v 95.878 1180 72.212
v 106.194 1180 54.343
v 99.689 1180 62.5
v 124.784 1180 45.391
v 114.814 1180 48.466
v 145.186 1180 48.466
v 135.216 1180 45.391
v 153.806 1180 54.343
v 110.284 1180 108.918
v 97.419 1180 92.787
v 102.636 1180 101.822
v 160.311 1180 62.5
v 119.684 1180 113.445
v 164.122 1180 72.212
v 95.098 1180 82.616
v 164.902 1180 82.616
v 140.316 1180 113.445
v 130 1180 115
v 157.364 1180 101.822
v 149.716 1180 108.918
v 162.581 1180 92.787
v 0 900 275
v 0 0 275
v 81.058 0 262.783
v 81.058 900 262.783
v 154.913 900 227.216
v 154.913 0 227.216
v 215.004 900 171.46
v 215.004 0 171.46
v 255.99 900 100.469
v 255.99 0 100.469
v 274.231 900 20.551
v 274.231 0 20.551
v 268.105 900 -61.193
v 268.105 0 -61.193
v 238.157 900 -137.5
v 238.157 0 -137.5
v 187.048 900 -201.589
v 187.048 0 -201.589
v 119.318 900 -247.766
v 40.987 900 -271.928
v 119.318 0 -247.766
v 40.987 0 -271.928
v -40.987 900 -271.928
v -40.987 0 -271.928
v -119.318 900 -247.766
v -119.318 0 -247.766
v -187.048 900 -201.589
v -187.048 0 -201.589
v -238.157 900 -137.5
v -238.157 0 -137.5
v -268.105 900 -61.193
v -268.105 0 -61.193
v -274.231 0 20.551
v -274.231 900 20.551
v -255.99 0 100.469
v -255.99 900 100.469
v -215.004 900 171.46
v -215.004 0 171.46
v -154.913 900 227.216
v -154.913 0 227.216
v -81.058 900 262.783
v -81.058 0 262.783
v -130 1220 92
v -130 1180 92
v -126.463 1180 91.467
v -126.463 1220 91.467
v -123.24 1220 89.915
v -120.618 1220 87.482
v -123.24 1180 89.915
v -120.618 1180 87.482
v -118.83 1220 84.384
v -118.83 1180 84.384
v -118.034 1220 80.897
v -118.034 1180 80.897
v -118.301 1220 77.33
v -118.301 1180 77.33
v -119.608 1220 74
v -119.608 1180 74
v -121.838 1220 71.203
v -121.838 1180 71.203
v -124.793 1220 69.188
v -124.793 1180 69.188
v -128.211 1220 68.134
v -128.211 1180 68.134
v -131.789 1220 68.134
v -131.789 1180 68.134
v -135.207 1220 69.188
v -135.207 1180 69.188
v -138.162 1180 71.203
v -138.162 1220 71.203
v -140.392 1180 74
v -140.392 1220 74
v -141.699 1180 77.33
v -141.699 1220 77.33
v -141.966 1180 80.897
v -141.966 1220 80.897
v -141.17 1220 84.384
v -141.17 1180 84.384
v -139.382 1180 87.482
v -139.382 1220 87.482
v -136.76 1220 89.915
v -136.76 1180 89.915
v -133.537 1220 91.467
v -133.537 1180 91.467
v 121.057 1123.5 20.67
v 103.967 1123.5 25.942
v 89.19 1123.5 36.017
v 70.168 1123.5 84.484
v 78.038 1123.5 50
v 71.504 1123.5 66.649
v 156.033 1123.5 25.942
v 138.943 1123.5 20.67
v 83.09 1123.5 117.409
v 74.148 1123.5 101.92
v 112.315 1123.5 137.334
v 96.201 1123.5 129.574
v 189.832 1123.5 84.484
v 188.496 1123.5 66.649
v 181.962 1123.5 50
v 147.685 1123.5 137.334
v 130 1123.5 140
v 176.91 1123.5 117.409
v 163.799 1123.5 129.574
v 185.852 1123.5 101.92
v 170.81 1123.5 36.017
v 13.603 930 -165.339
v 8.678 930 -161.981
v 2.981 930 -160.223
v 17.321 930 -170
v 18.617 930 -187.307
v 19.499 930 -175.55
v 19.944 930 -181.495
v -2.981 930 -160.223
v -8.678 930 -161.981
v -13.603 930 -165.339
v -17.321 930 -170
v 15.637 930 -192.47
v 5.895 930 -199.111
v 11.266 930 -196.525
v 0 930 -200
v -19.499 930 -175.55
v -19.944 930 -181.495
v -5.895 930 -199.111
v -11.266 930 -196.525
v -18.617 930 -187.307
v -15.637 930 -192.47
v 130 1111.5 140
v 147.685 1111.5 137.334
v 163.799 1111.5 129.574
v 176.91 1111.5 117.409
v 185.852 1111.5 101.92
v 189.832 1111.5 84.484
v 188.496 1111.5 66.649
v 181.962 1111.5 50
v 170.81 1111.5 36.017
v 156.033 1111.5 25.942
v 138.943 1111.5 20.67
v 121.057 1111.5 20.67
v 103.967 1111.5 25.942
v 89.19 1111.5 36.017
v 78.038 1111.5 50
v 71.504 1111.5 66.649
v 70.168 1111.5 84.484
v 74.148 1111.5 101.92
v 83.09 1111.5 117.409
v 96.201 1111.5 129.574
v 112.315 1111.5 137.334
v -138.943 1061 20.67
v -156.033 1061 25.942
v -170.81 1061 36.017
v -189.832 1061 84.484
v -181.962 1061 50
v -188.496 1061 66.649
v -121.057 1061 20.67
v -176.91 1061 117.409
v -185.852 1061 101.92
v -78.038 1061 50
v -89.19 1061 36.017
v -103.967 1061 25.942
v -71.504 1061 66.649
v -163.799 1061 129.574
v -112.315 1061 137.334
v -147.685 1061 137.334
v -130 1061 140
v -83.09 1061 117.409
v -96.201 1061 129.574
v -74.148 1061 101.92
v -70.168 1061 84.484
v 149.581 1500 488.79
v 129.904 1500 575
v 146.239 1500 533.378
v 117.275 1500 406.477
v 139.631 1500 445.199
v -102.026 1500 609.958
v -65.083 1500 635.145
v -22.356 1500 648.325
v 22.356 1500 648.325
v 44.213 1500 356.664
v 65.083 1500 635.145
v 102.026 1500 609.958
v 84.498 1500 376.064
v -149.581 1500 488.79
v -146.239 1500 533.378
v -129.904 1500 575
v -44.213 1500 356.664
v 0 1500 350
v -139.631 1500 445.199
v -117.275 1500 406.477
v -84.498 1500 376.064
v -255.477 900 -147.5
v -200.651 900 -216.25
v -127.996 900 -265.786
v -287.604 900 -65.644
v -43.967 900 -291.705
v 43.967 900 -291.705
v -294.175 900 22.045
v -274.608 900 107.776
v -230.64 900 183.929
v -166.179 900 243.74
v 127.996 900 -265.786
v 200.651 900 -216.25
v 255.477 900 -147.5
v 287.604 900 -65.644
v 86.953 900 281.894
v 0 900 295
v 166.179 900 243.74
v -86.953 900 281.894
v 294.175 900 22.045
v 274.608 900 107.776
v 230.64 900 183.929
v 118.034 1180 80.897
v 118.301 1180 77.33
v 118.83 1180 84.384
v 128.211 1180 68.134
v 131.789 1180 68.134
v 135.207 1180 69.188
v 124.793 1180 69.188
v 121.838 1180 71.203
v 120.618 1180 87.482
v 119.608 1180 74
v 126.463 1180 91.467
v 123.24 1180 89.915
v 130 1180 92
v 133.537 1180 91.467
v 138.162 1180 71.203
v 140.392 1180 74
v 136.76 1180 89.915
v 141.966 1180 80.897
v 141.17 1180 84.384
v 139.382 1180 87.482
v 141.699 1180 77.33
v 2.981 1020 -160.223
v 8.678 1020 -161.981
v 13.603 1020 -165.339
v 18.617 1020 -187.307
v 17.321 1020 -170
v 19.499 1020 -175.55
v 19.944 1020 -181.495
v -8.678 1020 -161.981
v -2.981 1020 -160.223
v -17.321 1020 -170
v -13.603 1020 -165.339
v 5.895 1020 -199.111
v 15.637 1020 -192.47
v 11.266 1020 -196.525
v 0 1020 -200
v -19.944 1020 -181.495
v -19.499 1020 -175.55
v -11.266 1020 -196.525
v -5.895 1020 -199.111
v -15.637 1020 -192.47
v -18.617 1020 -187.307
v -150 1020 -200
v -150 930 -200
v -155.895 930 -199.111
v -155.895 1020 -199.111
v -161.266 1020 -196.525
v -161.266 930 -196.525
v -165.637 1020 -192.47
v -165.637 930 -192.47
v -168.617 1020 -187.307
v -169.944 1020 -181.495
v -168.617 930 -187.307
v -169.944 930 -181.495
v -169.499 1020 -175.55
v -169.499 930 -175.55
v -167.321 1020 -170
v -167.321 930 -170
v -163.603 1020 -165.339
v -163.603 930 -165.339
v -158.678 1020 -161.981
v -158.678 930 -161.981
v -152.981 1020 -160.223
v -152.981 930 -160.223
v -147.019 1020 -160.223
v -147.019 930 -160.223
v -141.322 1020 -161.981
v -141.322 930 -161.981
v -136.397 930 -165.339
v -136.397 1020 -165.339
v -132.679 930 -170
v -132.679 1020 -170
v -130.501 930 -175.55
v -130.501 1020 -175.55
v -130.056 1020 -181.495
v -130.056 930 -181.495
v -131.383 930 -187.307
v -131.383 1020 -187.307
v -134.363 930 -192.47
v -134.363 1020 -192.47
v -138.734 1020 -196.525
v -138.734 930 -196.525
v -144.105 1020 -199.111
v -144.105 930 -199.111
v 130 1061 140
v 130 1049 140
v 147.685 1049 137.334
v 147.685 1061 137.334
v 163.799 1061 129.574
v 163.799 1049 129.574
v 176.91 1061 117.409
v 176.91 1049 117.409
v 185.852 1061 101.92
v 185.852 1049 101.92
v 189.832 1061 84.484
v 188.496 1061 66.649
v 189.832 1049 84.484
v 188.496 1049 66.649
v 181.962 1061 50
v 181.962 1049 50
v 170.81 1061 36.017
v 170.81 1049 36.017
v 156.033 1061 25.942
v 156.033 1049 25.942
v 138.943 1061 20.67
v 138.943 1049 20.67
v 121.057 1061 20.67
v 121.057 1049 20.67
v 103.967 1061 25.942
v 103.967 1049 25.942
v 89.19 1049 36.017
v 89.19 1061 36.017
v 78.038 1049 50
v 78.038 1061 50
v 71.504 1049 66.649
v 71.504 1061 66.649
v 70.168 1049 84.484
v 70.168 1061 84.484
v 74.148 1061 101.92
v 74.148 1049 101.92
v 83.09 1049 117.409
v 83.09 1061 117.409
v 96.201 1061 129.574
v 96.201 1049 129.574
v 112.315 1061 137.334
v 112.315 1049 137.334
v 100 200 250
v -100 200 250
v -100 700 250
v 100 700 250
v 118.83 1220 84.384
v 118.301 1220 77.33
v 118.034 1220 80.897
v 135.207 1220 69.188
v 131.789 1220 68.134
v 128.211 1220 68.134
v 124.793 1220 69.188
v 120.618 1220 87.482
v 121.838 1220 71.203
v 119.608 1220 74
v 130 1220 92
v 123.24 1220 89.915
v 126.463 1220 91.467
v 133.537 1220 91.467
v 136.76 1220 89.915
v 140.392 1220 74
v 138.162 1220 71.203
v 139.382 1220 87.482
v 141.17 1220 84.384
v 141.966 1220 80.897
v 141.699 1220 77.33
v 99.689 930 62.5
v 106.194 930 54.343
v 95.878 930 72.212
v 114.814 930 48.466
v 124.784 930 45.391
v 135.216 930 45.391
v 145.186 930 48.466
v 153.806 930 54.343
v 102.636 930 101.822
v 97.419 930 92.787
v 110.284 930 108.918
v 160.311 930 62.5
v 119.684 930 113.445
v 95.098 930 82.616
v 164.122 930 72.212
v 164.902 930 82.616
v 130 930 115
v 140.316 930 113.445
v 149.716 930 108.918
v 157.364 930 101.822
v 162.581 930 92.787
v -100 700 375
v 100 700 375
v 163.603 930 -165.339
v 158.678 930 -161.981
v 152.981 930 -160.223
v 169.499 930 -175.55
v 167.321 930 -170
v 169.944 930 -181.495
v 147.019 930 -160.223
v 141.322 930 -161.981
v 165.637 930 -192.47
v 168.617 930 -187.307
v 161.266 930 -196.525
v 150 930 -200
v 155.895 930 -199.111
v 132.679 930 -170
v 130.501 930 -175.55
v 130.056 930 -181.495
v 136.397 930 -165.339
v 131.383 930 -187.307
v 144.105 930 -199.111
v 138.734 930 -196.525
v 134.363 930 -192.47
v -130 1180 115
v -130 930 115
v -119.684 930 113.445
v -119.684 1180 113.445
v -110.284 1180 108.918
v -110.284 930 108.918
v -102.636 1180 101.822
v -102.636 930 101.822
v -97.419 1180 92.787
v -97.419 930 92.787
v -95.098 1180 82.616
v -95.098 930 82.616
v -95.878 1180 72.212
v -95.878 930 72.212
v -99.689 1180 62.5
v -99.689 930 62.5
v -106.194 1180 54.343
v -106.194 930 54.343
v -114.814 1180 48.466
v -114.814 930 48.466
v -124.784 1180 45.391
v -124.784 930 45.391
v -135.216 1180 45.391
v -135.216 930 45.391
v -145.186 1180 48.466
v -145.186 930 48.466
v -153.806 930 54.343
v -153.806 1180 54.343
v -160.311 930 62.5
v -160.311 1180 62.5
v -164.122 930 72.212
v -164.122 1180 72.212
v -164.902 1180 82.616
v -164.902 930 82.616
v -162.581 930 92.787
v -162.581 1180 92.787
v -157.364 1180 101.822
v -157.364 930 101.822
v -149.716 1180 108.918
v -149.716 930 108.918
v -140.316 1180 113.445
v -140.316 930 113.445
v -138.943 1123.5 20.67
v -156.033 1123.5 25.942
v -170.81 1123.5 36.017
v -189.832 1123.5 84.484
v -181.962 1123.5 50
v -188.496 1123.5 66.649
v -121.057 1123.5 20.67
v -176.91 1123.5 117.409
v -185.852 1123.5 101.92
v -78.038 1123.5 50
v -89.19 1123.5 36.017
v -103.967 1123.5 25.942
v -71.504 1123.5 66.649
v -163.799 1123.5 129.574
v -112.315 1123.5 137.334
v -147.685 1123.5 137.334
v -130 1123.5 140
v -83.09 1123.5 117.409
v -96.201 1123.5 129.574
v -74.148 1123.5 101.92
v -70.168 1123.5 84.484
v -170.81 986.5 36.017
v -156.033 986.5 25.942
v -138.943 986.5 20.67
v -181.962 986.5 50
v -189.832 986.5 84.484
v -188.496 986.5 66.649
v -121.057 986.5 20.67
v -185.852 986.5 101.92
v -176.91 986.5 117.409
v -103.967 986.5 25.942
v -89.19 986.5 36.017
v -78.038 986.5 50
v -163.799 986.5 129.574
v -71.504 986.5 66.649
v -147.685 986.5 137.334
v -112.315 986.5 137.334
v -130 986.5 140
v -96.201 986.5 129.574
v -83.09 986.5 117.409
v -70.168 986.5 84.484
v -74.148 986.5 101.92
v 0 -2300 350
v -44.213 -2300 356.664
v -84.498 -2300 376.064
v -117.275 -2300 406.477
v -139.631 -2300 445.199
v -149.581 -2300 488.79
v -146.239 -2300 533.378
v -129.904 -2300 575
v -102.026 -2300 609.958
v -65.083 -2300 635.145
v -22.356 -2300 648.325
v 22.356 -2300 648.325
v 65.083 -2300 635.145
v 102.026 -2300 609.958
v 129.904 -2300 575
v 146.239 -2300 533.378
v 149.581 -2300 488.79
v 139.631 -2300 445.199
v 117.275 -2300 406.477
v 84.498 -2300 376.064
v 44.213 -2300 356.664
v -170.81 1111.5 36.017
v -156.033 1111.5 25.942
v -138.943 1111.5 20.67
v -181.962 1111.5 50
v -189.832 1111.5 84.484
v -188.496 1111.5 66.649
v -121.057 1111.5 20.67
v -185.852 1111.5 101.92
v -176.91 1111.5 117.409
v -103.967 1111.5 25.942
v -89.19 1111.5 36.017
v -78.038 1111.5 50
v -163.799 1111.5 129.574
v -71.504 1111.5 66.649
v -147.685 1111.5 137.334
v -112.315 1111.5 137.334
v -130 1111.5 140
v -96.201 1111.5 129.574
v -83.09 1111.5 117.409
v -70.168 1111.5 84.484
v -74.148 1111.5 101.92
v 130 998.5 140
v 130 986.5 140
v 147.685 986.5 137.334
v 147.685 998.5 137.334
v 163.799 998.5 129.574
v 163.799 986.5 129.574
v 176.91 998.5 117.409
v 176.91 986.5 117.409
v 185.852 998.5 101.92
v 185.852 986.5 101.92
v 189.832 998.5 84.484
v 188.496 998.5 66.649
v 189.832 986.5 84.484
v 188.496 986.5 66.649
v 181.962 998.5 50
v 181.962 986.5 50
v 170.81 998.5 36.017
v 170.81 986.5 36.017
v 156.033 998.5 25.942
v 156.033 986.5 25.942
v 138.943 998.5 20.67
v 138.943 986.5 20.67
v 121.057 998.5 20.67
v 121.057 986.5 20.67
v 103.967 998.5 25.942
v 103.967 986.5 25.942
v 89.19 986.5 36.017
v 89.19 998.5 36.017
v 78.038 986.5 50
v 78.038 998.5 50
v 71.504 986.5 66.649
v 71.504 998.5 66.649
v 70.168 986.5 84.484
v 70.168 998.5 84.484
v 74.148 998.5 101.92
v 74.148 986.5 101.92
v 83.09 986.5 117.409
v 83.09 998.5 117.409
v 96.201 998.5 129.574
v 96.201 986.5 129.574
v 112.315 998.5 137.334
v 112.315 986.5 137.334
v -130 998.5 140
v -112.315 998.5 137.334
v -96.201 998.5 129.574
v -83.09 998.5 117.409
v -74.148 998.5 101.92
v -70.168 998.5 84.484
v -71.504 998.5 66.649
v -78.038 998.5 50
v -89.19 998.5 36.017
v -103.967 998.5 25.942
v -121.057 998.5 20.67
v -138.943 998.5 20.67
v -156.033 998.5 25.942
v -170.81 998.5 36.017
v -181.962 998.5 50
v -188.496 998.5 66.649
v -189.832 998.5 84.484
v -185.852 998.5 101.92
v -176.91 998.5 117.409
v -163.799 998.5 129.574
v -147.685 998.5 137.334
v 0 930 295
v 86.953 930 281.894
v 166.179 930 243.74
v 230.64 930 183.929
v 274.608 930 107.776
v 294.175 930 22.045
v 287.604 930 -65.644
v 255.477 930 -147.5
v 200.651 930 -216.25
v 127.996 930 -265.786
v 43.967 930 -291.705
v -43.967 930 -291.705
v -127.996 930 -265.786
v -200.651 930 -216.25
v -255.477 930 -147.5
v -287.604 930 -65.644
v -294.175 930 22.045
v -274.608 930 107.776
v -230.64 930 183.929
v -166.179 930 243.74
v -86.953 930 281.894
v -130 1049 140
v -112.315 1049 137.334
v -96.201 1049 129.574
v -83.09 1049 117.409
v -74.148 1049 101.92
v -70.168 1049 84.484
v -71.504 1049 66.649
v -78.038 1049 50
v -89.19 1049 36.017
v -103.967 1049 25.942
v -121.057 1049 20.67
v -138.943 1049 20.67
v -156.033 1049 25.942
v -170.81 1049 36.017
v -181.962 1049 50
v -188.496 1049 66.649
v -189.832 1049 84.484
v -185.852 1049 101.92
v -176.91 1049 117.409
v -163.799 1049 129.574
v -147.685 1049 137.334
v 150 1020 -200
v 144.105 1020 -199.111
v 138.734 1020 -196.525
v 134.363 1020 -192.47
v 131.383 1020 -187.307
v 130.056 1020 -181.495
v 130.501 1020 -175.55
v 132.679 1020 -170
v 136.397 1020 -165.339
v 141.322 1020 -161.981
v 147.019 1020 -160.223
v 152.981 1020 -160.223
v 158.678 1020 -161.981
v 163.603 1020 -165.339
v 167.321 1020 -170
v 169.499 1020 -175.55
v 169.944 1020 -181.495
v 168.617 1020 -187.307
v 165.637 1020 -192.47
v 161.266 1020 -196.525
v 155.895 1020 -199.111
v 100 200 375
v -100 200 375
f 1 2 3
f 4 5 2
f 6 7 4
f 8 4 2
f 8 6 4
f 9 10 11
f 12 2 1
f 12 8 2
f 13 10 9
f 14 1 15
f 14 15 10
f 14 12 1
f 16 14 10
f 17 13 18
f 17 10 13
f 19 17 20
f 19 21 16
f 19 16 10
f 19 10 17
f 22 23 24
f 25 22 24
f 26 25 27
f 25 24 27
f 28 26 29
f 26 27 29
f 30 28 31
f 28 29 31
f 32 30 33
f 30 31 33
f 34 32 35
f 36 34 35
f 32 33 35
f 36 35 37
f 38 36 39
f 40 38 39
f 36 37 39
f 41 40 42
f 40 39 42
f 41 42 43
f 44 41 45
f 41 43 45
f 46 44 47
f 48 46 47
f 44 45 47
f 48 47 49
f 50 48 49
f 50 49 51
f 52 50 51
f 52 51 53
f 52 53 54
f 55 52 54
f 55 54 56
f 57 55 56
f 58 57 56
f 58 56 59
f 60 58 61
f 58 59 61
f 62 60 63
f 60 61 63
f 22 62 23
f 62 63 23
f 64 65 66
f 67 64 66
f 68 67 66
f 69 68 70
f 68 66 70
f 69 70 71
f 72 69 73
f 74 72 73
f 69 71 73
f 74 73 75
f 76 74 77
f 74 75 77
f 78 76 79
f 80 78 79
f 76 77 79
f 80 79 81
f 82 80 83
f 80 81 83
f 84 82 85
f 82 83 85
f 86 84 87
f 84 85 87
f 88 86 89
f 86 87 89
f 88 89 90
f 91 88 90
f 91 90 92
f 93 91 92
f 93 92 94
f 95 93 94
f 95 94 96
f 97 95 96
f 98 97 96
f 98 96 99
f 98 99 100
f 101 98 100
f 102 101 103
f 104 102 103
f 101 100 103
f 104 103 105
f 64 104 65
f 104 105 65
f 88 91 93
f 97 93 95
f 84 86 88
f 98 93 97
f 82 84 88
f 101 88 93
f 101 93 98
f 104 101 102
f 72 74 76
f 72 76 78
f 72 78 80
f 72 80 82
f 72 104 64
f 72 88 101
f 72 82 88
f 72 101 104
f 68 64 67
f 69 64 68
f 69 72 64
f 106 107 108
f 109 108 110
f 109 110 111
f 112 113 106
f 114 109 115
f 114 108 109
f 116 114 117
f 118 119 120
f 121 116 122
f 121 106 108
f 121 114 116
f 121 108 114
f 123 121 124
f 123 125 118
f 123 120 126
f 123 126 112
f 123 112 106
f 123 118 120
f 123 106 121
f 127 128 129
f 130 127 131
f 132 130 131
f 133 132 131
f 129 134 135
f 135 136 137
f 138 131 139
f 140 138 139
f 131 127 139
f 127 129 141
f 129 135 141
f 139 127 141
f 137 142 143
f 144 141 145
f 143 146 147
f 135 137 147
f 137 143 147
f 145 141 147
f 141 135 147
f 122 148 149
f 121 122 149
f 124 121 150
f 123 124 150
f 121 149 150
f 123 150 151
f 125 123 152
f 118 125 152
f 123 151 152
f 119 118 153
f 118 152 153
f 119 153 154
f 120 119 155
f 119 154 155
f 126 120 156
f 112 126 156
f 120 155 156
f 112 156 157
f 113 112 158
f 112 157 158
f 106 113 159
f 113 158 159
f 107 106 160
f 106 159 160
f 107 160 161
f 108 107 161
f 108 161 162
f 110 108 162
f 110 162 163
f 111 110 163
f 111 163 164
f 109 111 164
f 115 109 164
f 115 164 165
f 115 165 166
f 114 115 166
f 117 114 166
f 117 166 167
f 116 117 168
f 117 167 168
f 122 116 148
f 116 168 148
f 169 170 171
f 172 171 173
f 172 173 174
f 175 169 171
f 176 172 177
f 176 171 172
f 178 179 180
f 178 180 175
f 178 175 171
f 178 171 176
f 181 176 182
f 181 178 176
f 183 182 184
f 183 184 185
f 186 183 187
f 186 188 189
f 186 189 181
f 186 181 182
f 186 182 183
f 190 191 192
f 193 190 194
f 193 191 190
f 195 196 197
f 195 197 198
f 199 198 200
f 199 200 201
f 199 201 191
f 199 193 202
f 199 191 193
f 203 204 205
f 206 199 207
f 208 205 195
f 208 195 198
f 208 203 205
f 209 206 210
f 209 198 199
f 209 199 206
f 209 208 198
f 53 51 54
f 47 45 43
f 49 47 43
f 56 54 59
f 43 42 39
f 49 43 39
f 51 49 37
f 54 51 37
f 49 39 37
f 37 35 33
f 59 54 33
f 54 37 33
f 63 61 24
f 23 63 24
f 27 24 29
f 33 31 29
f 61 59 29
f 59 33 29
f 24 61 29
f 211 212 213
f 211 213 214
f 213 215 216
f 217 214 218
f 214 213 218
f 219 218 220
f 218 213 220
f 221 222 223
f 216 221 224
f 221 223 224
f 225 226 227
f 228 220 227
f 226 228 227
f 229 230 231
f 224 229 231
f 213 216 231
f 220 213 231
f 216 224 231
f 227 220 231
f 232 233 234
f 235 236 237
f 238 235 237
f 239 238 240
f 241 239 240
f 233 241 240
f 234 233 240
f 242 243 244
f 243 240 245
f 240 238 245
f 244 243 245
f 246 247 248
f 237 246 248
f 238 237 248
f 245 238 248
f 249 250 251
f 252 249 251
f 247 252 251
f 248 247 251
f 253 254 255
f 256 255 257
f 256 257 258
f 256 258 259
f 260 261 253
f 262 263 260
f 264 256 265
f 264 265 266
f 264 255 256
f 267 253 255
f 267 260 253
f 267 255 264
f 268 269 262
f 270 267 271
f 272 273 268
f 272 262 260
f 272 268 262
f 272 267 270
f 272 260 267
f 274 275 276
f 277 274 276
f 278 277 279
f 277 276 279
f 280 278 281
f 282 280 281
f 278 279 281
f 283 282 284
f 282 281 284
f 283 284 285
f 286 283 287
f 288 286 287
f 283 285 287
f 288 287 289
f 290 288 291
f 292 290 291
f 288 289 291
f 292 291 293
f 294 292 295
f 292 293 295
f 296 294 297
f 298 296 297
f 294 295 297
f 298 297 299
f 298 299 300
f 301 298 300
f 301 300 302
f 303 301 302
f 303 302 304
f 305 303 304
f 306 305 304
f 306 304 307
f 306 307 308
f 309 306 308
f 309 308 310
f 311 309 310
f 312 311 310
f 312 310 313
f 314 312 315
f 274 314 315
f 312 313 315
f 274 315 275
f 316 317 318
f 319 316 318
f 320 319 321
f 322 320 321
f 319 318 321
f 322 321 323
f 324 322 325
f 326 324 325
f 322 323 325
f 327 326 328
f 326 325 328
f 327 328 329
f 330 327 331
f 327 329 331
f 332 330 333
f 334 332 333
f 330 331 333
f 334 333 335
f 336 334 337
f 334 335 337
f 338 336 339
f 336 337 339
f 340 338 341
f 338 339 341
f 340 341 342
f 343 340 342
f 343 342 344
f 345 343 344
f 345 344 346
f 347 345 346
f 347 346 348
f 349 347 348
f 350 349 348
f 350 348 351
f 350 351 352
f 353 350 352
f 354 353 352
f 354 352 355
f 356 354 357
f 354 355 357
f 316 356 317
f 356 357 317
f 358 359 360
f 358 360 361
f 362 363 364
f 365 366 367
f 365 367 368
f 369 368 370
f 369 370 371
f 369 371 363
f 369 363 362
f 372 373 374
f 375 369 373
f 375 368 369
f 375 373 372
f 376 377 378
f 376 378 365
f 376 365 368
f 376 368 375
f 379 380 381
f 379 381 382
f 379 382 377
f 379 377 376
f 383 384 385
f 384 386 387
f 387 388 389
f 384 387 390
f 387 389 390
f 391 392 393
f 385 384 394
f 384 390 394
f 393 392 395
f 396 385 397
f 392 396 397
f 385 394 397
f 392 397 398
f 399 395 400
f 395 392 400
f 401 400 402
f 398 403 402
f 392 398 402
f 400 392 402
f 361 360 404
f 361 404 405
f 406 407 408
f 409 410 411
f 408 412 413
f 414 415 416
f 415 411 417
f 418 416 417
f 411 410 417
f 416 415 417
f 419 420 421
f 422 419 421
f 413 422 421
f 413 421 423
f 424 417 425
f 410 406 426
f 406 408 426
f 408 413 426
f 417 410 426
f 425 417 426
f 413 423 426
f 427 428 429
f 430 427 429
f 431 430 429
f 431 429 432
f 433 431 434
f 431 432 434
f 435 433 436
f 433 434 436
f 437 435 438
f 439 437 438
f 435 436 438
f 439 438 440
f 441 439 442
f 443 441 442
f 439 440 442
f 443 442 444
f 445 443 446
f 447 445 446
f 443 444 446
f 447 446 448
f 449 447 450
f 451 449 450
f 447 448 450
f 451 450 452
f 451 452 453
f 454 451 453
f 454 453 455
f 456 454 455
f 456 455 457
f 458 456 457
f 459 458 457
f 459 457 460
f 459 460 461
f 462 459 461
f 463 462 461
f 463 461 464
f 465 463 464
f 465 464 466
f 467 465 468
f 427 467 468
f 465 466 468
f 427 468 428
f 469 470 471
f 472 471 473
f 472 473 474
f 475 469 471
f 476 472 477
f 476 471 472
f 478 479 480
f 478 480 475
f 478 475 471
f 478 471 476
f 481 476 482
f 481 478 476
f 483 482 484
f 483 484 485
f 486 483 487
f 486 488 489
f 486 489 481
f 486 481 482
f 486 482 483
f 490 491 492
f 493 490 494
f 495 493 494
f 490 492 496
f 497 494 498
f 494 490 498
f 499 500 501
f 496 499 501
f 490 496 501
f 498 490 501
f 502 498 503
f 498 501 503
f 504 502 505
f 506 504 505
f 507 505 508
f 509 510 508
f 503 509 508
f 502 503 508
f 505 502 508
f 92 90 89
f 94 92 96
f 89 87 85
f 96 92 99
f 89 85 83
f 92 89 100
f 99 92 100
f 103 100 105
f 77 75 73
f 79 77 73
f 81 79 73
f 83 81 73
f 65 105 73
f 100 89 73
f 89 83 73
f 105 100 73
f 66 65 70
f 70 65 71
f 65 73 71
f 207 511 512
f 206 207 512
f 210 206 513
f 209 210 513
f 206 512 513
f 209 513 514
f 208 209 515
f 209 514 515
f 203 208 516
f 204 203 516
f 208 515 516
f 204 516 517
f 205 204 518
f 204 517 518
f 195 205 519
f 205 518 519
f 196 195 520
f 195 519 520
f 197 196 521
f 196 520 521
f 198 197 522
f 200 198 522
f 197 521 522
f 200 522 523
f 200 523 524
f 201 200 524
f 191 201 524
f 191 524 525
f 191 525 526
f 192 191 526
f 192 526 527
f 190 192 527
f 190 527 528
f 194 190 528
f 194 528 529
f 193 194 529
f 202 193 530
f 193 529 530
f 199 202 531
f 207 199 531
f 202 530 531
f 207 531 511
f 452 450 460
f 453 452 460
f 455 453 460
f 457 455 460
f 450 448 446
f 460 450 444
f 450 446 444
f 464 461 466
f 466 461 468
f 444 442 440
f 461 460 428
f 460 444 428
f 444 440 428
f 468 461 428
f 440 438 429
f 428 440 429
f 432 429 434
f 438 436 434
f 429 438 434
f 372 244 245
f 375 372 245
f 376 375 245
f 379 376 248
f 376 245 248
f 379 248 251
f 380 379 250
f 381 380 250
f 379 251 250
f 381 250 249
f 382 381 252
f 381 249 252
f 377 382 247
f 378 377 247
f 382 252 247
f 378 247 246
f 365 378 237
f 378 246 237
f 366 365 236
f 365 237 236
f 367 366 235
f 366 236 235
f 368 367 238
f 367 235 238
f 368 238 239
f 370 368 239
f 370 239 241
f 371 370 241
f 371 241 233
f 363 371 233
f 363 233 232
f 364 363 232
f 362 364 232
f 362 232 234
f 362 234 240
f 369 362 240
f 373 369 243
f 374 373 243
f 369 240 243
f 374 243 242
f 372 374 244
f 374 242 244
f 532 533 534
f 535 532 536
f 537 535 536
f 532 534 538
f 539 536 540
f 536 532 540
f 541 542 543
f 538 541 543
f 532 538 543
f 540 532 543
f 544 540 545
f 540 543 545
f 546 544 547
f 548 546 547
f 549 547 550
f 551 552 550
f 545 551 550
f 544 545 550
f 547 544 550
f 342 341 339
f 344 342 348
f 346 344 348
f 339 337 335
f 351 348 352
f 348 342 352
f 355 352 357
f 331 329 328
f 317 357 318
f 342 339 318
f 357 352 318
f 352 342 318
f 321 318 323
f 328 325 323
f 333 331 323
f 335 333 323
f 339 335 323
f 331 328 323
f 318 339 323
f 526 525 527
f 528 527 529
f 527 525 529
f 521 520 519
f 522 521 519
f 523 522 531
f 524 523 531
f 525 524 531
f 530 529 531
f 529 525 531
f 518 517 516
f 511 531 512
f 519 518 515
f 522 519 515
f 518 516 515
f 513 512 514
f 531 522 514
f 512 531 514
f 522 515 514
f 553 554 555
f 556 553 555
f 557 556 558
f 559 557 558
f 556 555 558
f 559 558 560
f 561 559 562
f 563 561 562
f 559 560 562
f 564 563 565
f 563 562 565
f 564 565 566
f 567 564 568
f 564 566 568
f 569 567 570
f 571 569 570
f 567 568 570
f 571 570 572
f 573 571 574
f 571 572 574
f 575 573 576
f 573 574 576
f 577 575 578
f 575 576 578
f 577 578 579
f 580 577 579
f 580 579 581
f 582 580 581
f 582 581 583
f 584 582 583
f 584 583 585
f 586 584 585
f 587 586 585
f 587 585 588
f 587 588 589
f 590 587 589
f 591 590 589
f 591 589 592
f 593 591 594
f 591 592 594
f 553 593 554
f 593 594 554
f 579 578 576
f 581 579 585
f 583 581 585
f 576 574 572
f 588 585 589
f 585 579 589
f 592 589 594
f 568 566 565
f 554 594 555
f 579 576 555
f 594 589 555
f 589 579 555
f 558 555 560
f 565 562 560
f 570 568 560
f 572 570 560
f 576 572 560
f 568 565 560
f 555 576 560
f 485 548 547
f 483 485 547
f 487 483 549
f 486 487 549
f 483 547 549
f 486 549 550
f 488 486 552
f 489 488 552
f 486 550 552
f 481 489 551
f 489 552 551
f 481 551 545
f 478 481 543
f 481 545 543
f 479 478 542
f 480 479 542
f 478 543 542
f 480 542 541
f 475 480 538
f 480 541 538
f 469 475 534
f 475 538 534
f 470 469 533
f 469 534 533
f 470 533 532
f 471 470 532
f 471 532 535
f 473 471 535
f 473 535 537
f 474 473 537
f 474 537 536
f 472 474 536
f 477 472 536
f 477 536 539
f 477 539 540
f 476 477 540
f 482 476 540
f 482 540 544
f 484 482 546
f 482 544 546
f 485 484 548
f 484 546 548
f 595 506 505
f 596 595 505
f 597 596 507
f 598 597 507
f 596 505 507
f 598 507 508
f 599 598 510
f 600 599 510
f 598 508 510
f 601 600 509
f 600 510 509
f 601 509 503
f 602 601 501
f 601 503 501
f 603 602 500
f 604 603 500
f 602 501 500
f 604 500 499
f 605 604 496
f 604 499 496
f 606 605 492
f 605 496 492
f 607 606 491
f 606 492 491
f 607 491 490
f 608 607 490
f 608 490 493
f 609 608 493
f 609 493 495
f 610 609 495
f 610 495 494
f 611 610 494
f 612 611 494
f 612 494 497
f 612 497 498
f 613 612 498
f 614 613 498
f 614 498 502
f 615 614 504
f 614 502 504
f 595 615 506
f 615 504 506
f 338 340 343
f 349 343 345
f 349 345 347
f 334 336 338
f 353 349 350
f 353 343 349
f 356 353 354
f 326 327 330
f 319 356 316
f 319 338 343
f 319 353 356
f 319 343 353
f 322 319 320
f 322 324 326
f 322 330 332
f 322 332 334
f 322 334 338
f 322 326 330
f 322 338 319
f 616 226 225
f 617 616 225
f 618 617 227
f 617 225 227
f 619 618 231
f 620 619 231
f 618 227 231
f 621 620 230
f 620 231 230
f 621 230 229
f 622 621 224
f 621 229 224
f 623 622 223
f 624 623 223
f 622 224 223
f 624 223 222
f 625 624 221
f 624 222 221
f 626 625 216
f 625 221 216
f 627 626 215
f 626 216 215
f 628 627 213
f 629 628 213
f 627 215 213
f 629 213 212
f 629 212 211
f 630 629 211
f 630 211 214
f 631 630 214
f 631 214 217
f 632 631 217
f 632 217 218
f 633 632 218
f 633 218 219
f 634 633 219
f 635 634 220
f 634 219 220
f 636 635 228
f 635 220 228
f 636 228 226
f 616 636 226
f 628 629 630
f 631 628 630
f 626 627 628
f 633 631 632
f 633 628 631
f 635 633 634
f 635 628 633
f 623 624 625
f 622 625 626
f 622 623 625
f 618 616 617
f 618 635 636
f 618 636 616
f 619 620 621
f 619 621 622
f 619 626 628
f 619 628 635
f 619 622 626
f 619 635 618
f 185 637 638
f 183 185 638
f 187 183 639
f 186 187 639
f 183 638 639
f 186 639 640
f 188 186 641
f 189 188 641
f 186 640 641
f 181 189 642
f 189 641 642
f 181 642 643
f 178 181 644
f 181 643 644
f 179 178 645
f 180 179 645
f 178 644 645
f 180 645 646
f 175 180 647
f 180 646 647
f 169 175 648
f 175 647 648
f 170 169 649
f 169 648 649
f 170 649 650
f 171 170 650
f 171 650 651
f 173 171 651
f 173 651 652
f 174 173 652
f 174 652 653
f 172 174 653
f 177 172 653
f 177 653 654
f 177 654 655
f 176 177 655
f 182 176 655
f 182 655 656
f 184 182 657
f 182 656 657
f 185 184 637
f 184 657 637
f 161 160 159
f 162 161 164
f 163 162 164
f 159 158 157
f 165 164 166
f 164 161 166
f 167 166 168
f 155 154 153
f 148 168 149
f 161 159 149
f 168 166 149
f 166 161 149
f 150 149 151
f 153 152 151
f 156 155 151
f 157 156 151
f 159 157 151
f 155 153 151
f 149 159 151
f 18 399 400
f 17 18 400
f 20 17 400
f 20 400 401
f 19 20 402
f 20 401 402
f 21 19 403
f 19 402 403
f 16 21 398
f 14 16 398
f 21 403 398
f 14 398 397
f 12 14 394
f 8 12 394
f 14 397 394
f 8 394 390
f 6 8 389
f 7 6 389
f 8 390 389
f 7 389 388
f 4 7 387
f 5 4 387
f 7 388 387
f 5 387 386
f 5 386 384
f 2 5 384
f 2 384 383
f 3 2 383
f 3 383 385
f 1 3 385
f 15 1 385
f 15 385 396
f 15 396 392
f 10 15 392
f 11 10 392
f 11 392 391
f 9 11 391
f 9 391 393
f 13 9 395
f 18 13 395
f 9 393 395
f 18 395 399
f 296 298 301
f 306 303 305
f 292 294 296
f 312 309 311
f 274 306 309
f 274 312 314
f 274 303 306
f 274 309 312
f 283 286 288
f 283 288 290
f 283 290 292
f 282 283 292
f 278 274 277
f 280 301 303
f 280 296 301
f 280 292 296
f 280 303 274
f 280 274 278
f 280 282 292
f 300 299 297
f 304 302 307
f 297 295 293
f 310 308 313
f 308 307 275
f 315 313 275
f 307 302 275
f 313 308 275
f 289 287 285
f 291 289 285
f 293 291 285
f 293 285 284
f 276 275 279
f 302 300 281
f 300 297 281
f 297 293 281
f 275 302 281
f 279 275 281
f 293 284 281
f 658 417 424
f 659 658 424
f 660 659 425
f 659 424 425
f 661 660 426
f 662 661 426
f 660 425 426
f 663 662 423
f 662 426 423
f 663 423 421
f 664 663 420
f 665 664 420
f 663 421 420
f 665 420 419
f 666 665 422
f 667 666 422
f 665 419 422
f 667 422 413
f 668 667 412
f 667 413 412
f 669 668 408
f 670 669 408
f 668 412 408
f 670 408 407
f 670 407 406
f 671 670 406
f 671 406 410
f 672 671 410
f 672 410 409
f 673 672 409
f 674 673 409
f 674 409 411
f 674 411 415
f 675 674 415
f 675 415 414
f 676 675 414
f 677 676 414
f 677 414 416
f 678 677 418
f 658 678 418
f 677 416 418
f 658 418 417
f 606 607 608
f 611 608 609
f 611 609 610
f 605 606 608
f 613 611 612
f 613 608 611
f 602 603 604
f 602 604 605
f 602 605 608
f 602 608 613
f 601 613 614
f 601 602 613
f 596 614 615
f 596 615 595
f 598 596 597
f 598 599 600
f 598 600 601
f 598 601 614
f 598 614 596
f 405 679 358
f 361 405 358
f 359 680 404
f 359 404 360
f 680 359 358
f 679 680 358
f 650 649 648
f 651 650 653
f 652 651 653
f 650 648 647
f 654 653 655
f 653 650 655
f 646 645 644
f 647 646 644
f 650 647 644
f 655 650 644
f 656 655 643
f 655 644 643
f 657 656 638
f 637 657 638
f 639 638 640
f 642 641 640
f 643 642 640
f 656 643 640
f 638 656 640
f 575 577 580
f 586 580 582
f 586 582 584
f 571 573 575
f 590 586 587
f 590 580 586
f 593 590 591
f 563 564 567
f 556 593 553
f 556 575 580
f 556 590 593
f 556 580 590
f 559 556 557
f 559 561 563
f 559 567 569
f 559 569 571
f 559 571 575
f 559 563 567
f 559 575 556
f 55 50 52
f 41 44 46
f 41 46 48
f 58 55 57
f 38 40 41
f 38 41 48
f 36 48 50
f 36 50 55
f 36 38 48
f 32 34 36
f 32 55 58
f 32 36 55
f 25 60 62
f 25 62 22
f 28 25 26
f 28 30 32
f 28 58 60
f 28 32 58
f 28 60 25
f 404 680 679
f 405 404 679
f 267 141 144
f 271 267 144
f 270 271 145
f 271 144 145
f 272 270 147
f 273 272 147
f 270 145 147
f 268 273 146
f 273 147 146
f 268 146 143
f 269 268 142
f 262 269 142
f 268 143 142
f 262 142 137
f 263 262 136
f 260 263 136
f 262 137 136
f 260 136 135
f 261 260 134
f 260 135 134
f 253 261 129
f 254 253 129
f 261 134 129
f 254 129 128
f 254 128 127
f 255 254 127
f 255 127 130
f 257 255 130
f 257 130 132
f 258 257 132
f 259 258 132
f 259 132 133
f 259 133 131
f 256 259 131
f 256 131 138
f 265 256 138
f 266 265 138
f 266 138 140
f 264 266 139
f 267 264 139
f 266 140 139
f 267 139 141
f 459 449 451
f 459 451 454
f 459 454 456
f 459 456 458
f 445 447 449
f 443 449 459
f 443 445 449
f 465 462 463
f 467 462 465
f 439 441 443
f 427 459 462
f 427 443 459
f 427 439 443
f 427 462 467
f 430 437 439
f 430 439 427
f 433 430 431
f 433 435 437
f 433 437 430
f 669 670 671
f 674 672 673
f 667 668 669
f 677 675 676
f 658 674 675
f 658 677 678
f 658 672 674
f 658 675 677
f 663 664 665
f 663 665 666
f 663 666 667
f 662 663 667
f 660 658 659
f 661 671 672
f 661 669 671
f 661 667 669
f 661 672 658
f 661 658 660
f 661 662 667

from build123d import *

# Parameters (mm, degrees)
SKETCH1_R           = 275
TANK_DEPTH          = 900
LID_START           = 900
SKETCH2_R           = 295
LID_DEPTH           = 30
POLE_START          = -2300
SKETCH3_R           = 150
POLE_DEPTH          = 3800
BUSHING_START       = 930
SKETCH4_R           = 35
BUSHING_HV_1_DEPTH  = 250
SHED_START          = 986.5
SKETCH5_R           = 60
SHED_HV_1_1_DEPTH   = 12
SHED_START_2        = 1049
SKETCH6_R           = 60
SHED_HV_1_2_DEPTH   = 12
SHED_START_3        = 1111.5
SKETCH7_R           = 60
SHED_HV_1_3_DEPTH   = 12
TERMINAL_START      = 1180
SKETCH8_R           = 12
TERMINAL_HV_1_DEPTH = 40
SKETCH9_R           = 35
BUSHING_HV_2_DEPTH  = 250
SKETCH10_R          = 60
SHED_HV_2_1_DEPTH   = 12
SKETCH11_R          = 60
SHED_HV_2_2_DEPTH   = 12
SKETCH12_R          = 60
SHED_HV_2_3_DEPTH   = 12
SKETCH13_R          = 12
TERMINAL_HV_2_DEPTH = 40
LV_START            = 930
SKETCH14_R          = 20
LV_BUSHING_1_DEPTH  = 90
SKETCH15_R          = 20
LV_BUSHING_2_DEPTH  = 90
SKETCH16_R          = 20
LV_BUSHING_3_DEPTH  = 90
HANGER_START        = 200
SKETCH17_W          = 200
SKETCH17_H          = 125
HANGER_DEPTH        = 500


with BuildPart() as part:
    # Sketch1 → Tank (new body)
    with BuildSketch(Plane(origin=(0, 0, 0), x_dir=(1, 0, 0), z_dir=(0, 1, 0))):
        with Locations(Location((0, 0, 0), (0, 0, 270))):
            Circle(SKETCH1_R)
    extrude(amount=TANK_DEPTH)


with BuildPart() as body_2:
    # Sketch2 → Lid (new body)
    with BuildSketch(Plane(origin=(0, 0, 0), x_dir=(1, 0, 0), z_dir=(0, 1, 0)).offset(LID_START)):
        with Locations(Location((0, 0, 0), (0, 0, 270))):
            Circle(SKETCH2_R)
    extrude(amount=LID_DEPTH)


with BuildPart() as body_3:
    # Sketch3 → Pole (new body)
    with BuildSketch(Plane(origin=(0, 0, 0), x_dir=(1, 0, 0), z_dir=(0, 1, 0)).offset(POLE_START)):
        with Locations(Location((0, -500, 0), (0, 0, 90))):
            Circle(SKETCH3_R)
    extrude(amount=POLE_DEPTH)


with BuildPart() as body_4:
    # Sketch4 → Bushing HV 1 (new body)
    with BuildSketch(Plane(origin=(0, 0, 0), x_dir=(1, 0, 0), z_dir=(0, 1, 0)).offset(BUSHING_START)):
        with Locations(Location((-130, -80, 0), (0, 0, 270))):
            Circle(SKETCH4_R)
    extrude(amount=BUSHING_HV_1_DEPTH)


with BuildPart() as body_5:
    # Sketch5 → Shed HV 1 1 (new body)
    with BuildSketch(Plane(origin=(0, 0, 0), x_dir=(1, 0, 0), z_dir=(0, 1, 0)).offset(SHED_START)):
        with Locations(Location((-130, -80, 0), (0, 0, 270))):
            Circle(SKETCH5_R)
    extrude(amount=SHED_HV_1_1_DEPTH)


with BuildPart() as body_6:
    # Sketch6 → Shed HV 1 2 (new body)
    with BuildSketch(Plane(origin=(0, 0, 0), x_dir=(1, 0, 0), z_dir=(0, 1, 0)).offset(SHED_START_2)):
        with Locations(Location((-130, -80, 0), (0, 0, 270))):
            Circle(SKETCH6_R)
    extrude(amount=SHED_HV_1_2_DEPTH)


with BuildPart() as body_7:
    # Sketch7 → Shed HV 1 3 (new body)
    with BuildSketch(Plane(origin=(0, 0, 0), x_dir=(1, 0, 0), z_dir=(0, 1, 0)).offset(SHED_START_3)):
        with Locations(Location((-130, -80, 0), (0, 0, 270))):
            Circle(SKETCH7_R)
    extrude(amount=SHED_HV_1_3_DEPTH)


with BuildPart() as body_8:
    # Sketch8 → Terminal HV 1 (new body)
    with BuildSketch(Plane(origin=(0, 0, 0), x_dir=(1, 0, 0), z_dir=(0, 1, 0)).offset(TERMINAL_START)):
        with Locations(Location((-130, -80, 0), (0, 0, 270))):
            Circle(SKETCH8_R)
    extrude(amount=TERMINAL_HV_1_DEPTH)


with BuildPart() as body_9:
    # Sketch9 → Bushing HV 2 (new body)
    with BuildSketch(Plane(origin=(0, 0, 0), x_dir=(1, 0, 0), z_dir=(0, 1, 0)).offset(BUSHING_START)):
        with Locations(Location((130, -80, 0), (0, 0, 270))):
            Circle(SKETCH9_R)
    extrude(amount=BUSHING_HV_2_DEPTH)


with BuildPart() as body_10:
    # Sketch10 → Shed HV 2 1 (new body)
    with BuildSketch(Plane(origin=(0, 0, 0), x_dir=(1, 0, 0), z_dir=(0, 1, 0)).offset(SHED_START)):
        with Locations(Location((130, -80, 0), (0, 0, 270))):
            Circle(SKETCH10_R)
    extrude(amount=SHED_HV_2_1_DEPTH)


with BuildPart() as body_11:
    # Sketch11 → Shed HV 2 2 (new body)
    with BuildSketch(Plane(origin=(0, 0, 0), x_dir=(1, 0, 0), z_dir=(0, 1, 0)).offset(SHED_START_2)):
        with Locations(Location((130, -80, 0), (0, 0, 270))):
            Circle(SKETCH11_R)
    extrude(amount=SHED_HV_2_2_DEPTH)


with BuildPart() as body_12:
    # Sketch12 → Shed HV 2 3 (new body)
    with BuildSketch(Plane(origin=(0, 0, 0), x_dir=(1, 0, 0), z_dir=(0, 1, 0)).offset(SHED_START_3)):
        with Locations(Location((130, -80, 0), (0, 0, 270))):
            Circle(SKETCH12_R)
    extrude(amount=SHED_HV_2_3_DEPTH)


with BuildPart() as body_13:
    # Sketch13 → Terminal HV 2 (new body)
    with BuildSketch(Plane(origin=(0, 0, 0), x_dir=(1, 0, 0), z_dir=(0, 1, 0)).offset(TERMINAL_START)):
        with Locations(Location((130, -80, 0), (0, 0, 270))):
            Circle(SKETCH13_R)
    extrude(amount=TERMINAL_HV_2_DEPTH)


with BuildPart() as body_14:
    # Sketch14 → LV bushing 1 (new body)
    with BuildSketch(Plane(origin=(0, 0, 0), x_dir=(1, 0, 0), z_dir=(0, 1, 0)).offset(LV_START)):
        with Locations(Location((-150, 180, 0), (0, 0, 90))):
            Circle(SKETCH14_R)
    extrude(amount=LV_BUSHING_1_DEPTH)


with BuildPart() as body_15:
    # Sketch15 → LV bushing 2 (new body)
    with BuildSketch(Plane(origin=(0, 0, 0), x_dir=(1, 0, 0), z_dir=(0, 1, 0)).offset(LV_START)):
        with Locations(Location((0, 180, 0), (0, 0, 90))):
            Circle(SKETCH15_R)
    extrude(amount=LV_BUSHING_2_DEPTH)


with BuildPart() as body_16:
    # Sketch16 → LV bushing 3 (new body)
    with BuildSketch(Plane(origin=(0, 0, 0), x_dir=(1, 0, 0), z_dir=(0, 1, 0)).offset(LV_START)):
        with Locations(Location((150, 180, 0), (0, 0, 90))):
            Circle(SKETCH16_R)
    extrude(amount=LV_BUSHING_3_DEPTH)


with BuildPart() as body_17:
    # Sketch17 → Hanger (new body)
    with BuildSketch(Plane(origin=(0, 0, 0), x_dir=(1, 0, 0), z_dir=(0, 1, 0)).offset(HANGER_START)):
        with Locations((0, -312.5)):
            Rectangle(SKETCH17_W, SKETCH17_H)
    extrude(amount=HANGER_DEPTH)


solid = Compound([part.part, body_2.part, body_3.part, body_4.part, body_5.part, body_6.part, body_7.part, body_8.part, body_9.part, body_10.part, body_11.part, body_12.part, body_13.part, body_14.part, body_15.part, body_16.part, body_17.part])
